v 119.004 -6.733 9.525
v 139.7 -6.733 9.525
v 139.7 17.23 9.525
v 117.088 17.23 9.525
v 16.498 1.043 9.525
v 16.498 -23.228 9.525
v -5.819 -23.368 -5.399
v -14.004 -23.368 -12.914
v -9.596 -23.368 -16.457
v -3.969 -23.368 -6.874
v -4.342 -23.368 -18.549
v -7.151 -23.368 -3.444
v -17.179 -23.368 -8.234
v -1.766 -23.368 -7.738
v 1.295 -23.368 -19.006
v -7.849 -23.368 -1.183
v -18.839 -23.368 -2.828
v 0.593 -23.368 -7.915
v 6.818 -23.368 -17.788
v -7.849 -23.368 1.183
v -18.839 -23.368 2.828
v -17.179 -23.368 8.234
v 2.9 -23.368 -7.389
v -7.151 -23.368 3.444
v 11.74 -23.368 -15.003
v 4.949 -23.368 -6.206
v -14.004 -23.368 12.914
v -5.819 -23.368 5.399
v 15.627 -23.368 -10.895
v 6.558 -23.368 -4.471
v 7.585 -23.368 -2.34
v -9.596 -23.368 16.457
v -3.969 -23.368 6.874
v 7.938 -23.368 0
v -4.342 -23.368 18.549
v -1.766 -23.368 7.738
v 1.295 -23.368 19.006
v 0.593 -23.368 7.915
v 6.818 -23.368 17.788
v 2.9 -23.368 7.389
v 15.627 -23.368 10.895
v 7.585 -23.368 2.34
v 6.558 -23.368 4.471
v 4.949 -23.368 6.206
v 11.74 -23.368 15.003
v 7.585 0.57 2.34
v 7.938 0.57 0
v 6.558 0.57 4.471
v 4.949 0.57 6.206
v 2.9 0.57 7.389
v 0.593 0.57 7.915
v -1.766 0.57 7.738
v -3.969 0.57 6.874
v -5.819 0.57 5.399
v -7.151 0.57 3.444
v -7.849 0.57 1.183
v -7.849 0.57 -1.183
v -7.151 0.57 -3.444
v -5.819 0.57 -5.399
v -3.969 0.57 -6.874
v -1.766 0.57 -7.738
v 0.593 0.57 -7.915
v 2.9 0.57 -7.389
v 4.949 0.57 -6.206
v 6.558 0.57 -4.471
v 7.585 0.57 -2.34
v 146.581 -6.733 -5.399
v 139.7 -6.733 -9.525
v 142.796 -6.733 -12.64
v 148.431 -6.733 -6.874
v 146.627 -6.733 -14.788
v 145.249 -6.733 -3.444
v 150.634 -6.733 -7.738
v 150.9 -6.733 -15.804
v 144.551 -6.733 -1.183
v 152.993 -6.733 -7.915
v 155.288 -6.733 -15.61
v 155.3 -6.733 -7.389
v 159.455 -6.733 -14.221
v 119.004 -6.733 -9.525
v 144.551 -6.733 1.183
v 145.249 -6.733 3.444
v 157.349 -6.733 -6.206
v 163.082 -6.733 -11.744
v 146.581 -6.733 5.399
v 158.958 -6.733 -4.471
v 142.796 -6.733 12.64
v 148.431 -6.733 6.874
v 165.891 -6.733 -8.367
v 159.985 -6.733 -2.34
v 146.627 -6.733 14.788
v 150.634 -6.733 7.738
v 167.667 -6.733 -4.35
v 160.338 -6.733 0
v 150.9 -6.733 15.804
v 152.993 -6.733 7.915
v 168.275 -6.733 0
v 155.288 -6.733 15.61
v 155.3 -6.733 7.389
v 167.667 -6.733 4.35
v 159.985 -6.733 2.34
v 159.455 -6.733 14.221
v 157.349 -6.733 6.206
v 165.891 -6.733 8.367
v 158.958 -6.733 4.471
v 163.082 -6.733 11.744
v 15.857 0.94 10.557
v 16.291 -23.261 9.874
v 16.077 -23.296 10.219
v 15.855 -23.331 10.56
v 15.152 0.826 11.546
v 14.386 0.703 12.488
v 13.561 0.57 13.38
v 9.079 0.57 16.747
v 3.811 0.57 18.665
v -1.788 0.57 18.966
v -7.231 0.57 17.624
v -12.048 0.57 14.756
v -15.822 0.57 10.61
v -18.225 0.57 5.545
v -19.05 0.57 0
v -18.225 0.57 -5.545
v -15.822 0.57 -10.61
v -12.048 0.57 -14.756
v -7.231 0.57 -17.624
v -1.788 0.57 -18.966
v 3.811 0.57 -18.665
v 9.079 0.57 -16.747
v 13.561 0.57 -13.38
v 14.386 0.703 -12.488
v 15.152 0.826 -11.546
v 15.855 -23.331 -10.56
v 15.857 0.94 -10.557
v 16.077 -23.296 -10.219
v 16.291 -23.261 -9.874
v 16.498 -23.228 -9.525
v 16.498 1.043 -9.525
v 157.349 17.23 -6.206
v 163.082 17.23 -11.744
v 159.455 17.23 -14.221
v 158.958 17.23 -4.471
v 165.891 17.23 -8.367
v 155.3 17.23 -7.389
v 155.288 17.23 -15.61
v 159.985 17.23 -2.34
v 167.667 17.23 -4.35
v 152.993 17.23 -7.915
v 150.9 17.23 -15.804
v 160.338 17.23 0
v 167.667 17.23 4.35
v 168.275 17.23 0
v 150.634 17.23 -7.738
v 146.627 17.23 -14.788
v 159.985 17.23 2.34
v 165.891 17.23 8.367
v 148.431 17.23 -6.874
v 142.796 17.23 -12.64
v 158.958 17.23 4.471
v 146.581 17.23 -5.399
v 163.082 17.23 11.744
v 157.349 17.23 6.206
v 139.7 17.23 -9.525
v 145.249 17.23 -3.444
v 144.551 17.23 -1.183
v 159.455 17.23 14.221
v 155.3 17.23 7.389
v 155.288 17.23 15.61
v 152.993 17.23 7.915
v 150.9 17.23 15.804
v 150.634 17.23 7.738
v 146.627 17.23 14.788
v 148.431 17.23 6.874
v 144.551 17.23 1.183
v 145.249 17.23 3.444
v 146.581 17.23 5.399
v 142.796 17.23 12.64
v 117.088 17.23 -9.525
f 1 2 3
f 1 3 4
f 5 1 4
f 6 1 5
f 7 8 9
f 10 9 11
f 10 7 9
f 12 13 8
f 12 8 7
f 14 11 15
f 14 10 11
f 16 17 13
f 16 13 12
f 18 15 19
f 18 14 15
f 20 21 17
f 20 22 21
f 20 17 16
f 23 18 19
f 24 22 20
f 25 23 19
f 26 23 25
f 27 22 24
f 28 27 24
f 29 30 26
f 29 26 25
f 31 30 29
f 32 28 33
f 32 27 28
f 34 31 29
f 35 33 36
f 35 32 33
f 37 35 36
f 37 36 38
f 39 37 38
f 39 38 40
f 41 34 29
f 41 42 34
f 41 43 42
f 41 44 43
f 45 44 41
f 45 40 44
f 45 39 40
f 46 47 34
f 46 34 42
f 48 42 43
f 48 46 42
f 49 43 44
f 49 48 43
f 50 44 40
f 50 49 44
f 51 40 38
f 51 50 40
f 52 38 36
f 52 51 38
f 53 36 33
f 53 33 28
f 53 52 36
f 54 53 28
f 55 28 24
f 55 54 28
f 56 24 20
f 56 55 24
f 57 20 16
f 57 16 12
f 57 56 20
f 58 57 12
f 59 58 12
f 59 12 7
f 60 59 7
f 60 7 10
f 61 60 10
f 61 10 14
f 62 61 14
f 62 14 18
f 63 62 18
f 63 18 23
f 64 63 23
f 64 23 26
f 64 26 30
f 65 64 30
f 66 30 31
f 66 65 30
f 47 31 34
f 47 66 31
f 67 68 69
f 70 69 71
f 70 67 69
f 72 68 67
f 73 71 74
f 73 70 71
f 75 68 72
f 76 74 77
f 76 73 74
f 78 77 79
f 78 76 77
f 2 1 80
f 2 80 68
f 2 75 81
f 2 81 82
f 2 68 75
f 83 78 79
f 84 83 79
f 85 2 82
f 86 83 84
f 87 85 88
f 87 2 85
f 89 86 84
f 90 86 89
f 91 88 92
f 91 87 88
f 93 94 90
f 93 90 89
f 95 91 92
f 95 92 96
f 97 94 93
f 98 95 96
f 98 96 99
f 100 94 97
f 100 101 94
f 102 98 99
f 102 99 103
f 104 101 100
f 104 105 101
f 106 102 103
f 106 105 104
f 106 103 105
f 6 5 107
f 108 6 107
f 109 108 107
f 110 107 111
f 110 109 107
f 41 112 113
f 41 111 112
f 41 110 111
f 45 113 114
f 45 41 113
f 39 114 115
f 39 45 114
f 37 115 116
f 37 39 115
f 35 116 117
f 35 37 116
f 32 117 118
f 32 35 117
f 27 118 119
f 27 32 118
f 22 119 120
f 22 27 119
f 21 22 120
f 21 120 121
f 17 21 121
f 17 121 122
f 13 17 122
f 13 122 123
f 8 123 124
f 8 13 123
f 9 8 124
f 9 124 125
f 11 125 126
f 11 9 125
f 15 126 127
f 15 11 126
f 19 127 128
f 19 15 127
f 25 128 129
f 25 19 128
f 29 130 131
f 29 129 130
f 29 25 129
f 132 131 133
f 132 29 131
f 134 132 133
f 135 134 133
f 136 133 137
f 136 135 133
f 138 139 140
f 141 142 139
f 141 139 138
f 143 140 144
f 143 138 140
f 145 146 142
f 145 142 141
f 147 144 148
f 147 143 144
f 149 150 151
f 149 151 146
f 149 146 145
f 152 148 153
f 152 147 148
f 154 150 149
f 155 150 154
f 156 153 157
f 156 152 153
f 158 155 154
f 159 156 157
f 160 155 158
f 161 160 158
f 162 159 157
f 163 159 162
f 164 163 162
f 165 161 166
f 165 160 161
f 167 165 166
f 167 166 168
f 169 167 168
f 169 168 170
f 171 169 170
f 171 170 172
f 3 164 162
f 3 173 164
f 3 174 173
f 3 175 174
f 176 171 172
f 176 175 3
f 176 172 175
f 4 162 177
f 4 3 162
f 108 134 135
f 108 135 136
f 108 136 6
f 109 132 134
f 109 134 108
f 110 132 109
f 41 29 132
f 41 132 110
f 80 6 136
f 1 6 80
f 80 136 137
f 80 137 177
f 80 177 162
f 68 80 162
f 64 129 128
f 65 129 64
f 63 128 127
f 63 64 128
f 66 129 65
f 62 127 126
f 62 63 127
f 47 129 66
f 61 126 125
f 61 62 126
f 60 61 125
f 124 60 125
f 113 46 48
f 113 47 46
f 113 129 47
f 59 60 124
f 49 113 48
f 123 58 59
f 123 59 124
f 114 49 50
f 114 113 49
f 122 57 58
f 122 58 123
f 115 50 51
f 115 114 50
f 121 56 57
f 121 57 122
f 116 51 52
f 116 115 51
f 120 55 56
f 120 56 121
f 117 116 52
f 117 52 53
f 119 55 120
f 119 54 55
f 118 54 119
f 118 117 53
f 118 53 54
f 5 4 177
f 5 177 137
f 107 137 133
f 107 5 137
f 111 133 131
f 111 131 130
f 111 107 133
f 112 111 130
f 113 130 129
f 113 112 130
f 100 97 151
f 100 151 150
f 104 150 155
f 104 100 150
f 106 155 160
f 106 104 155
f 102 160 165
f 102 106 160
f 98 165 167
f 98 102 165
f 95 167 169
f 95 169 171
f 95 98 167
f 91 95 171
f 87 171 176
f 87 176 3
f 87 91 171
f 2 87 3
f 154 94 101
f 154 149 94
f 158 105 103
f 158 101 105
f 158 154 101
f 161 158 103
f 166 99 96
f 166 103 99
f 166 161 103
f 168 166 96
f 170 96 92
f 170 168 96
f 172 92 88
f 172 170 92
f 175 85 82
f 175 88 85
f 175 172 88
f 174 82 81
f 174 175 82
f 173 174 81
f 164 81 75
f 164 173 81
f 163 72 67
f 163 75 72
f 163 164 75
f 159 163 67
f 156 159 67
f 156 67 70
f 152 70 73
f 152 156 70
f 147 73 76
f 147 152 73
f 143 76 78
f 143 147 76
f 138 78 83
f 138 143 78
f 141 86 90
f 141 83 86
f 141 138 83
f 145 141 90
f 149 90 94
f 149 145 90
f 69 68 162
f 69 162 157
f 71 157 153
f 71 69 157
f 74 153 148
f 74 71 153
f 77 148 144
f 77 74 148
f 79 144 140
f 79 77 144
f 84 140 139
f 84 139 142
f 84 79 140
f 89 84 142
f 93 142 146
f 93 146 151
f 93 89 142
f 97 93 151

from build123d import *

# Parameters (mm, degrees)
F0_R     = 7.9375
F1_DEPTH = 23.368
F3_DEPTH = 25.4


with BuildPart() as f1:
    # F0 (on Front) → F1 (new body, symmetric)
    with BuildSketch(Plane.XZ):
        with BuildLine():
            ThreePointArc((16.497784, -9.525), (18.400887, -4.930503), (19.05, 0))
            ThreePointArc((19.05, 0), (18.400887, 4.930503), (16.497784, 9.525))
            ThreePointArc((16.497784, 9.525), (-19.05, 0), (16.497784, -9.525))
        make_face()
        Circle(F0_R, mode=Mode.SUBTRACT)
        with BuildLine():
            ThreePointArc((16.497784, 9.525), (18.400887, 4.930503), (19.05, 0))
            ThreePointArc((19.05, 0), (18.400887, -4.930503), (16.497784, -9.525))
            Line((16.497784, -9.525), (139.7, -9.525))
            ThreePointArc((139.7, -9.525), (136.525, 0), (139.7, 9.525))
            Line((139.7, 9.525), (16.497784, 9.525))
        make_face()
        with BuildLine():
            ThreePointArc((168.275, 0), (157.420116, 15.060347), (139.7, 9.525))
            ThreePointArc((139.7, 9.525), (136.525, 0), (139.7, -9.525))
            ThreePointArc((139.7, -9.525), (157.420116, -15.060347), (168.275, 0))
        make_face()
        with Locations((152.4, 0)):
            Circle(F0_R, mode=Mode.SUBTRACT)
    extrude(amount=F1_DEPTH, both=True)

    # F2 (on Top) → F3 (intersect, symmetric)
    with BuildSketch(Plane.XY):
        Polygon((-19.05, -23.368), (-19.05, -23.392219), (15.476332, -23.392219), (119.003983, -6.732617), (168.275, -6.732617), (168.275, 17.229946), (117.088285, 17.229946), (13.560635, 0.570344), (-19.05, 0.570344), (-19.05, -18.542036), align=None)
    extrude(amount=F3_DEPTH, both=True, mode=Mode.INTERSECT)


solid = f1.part
